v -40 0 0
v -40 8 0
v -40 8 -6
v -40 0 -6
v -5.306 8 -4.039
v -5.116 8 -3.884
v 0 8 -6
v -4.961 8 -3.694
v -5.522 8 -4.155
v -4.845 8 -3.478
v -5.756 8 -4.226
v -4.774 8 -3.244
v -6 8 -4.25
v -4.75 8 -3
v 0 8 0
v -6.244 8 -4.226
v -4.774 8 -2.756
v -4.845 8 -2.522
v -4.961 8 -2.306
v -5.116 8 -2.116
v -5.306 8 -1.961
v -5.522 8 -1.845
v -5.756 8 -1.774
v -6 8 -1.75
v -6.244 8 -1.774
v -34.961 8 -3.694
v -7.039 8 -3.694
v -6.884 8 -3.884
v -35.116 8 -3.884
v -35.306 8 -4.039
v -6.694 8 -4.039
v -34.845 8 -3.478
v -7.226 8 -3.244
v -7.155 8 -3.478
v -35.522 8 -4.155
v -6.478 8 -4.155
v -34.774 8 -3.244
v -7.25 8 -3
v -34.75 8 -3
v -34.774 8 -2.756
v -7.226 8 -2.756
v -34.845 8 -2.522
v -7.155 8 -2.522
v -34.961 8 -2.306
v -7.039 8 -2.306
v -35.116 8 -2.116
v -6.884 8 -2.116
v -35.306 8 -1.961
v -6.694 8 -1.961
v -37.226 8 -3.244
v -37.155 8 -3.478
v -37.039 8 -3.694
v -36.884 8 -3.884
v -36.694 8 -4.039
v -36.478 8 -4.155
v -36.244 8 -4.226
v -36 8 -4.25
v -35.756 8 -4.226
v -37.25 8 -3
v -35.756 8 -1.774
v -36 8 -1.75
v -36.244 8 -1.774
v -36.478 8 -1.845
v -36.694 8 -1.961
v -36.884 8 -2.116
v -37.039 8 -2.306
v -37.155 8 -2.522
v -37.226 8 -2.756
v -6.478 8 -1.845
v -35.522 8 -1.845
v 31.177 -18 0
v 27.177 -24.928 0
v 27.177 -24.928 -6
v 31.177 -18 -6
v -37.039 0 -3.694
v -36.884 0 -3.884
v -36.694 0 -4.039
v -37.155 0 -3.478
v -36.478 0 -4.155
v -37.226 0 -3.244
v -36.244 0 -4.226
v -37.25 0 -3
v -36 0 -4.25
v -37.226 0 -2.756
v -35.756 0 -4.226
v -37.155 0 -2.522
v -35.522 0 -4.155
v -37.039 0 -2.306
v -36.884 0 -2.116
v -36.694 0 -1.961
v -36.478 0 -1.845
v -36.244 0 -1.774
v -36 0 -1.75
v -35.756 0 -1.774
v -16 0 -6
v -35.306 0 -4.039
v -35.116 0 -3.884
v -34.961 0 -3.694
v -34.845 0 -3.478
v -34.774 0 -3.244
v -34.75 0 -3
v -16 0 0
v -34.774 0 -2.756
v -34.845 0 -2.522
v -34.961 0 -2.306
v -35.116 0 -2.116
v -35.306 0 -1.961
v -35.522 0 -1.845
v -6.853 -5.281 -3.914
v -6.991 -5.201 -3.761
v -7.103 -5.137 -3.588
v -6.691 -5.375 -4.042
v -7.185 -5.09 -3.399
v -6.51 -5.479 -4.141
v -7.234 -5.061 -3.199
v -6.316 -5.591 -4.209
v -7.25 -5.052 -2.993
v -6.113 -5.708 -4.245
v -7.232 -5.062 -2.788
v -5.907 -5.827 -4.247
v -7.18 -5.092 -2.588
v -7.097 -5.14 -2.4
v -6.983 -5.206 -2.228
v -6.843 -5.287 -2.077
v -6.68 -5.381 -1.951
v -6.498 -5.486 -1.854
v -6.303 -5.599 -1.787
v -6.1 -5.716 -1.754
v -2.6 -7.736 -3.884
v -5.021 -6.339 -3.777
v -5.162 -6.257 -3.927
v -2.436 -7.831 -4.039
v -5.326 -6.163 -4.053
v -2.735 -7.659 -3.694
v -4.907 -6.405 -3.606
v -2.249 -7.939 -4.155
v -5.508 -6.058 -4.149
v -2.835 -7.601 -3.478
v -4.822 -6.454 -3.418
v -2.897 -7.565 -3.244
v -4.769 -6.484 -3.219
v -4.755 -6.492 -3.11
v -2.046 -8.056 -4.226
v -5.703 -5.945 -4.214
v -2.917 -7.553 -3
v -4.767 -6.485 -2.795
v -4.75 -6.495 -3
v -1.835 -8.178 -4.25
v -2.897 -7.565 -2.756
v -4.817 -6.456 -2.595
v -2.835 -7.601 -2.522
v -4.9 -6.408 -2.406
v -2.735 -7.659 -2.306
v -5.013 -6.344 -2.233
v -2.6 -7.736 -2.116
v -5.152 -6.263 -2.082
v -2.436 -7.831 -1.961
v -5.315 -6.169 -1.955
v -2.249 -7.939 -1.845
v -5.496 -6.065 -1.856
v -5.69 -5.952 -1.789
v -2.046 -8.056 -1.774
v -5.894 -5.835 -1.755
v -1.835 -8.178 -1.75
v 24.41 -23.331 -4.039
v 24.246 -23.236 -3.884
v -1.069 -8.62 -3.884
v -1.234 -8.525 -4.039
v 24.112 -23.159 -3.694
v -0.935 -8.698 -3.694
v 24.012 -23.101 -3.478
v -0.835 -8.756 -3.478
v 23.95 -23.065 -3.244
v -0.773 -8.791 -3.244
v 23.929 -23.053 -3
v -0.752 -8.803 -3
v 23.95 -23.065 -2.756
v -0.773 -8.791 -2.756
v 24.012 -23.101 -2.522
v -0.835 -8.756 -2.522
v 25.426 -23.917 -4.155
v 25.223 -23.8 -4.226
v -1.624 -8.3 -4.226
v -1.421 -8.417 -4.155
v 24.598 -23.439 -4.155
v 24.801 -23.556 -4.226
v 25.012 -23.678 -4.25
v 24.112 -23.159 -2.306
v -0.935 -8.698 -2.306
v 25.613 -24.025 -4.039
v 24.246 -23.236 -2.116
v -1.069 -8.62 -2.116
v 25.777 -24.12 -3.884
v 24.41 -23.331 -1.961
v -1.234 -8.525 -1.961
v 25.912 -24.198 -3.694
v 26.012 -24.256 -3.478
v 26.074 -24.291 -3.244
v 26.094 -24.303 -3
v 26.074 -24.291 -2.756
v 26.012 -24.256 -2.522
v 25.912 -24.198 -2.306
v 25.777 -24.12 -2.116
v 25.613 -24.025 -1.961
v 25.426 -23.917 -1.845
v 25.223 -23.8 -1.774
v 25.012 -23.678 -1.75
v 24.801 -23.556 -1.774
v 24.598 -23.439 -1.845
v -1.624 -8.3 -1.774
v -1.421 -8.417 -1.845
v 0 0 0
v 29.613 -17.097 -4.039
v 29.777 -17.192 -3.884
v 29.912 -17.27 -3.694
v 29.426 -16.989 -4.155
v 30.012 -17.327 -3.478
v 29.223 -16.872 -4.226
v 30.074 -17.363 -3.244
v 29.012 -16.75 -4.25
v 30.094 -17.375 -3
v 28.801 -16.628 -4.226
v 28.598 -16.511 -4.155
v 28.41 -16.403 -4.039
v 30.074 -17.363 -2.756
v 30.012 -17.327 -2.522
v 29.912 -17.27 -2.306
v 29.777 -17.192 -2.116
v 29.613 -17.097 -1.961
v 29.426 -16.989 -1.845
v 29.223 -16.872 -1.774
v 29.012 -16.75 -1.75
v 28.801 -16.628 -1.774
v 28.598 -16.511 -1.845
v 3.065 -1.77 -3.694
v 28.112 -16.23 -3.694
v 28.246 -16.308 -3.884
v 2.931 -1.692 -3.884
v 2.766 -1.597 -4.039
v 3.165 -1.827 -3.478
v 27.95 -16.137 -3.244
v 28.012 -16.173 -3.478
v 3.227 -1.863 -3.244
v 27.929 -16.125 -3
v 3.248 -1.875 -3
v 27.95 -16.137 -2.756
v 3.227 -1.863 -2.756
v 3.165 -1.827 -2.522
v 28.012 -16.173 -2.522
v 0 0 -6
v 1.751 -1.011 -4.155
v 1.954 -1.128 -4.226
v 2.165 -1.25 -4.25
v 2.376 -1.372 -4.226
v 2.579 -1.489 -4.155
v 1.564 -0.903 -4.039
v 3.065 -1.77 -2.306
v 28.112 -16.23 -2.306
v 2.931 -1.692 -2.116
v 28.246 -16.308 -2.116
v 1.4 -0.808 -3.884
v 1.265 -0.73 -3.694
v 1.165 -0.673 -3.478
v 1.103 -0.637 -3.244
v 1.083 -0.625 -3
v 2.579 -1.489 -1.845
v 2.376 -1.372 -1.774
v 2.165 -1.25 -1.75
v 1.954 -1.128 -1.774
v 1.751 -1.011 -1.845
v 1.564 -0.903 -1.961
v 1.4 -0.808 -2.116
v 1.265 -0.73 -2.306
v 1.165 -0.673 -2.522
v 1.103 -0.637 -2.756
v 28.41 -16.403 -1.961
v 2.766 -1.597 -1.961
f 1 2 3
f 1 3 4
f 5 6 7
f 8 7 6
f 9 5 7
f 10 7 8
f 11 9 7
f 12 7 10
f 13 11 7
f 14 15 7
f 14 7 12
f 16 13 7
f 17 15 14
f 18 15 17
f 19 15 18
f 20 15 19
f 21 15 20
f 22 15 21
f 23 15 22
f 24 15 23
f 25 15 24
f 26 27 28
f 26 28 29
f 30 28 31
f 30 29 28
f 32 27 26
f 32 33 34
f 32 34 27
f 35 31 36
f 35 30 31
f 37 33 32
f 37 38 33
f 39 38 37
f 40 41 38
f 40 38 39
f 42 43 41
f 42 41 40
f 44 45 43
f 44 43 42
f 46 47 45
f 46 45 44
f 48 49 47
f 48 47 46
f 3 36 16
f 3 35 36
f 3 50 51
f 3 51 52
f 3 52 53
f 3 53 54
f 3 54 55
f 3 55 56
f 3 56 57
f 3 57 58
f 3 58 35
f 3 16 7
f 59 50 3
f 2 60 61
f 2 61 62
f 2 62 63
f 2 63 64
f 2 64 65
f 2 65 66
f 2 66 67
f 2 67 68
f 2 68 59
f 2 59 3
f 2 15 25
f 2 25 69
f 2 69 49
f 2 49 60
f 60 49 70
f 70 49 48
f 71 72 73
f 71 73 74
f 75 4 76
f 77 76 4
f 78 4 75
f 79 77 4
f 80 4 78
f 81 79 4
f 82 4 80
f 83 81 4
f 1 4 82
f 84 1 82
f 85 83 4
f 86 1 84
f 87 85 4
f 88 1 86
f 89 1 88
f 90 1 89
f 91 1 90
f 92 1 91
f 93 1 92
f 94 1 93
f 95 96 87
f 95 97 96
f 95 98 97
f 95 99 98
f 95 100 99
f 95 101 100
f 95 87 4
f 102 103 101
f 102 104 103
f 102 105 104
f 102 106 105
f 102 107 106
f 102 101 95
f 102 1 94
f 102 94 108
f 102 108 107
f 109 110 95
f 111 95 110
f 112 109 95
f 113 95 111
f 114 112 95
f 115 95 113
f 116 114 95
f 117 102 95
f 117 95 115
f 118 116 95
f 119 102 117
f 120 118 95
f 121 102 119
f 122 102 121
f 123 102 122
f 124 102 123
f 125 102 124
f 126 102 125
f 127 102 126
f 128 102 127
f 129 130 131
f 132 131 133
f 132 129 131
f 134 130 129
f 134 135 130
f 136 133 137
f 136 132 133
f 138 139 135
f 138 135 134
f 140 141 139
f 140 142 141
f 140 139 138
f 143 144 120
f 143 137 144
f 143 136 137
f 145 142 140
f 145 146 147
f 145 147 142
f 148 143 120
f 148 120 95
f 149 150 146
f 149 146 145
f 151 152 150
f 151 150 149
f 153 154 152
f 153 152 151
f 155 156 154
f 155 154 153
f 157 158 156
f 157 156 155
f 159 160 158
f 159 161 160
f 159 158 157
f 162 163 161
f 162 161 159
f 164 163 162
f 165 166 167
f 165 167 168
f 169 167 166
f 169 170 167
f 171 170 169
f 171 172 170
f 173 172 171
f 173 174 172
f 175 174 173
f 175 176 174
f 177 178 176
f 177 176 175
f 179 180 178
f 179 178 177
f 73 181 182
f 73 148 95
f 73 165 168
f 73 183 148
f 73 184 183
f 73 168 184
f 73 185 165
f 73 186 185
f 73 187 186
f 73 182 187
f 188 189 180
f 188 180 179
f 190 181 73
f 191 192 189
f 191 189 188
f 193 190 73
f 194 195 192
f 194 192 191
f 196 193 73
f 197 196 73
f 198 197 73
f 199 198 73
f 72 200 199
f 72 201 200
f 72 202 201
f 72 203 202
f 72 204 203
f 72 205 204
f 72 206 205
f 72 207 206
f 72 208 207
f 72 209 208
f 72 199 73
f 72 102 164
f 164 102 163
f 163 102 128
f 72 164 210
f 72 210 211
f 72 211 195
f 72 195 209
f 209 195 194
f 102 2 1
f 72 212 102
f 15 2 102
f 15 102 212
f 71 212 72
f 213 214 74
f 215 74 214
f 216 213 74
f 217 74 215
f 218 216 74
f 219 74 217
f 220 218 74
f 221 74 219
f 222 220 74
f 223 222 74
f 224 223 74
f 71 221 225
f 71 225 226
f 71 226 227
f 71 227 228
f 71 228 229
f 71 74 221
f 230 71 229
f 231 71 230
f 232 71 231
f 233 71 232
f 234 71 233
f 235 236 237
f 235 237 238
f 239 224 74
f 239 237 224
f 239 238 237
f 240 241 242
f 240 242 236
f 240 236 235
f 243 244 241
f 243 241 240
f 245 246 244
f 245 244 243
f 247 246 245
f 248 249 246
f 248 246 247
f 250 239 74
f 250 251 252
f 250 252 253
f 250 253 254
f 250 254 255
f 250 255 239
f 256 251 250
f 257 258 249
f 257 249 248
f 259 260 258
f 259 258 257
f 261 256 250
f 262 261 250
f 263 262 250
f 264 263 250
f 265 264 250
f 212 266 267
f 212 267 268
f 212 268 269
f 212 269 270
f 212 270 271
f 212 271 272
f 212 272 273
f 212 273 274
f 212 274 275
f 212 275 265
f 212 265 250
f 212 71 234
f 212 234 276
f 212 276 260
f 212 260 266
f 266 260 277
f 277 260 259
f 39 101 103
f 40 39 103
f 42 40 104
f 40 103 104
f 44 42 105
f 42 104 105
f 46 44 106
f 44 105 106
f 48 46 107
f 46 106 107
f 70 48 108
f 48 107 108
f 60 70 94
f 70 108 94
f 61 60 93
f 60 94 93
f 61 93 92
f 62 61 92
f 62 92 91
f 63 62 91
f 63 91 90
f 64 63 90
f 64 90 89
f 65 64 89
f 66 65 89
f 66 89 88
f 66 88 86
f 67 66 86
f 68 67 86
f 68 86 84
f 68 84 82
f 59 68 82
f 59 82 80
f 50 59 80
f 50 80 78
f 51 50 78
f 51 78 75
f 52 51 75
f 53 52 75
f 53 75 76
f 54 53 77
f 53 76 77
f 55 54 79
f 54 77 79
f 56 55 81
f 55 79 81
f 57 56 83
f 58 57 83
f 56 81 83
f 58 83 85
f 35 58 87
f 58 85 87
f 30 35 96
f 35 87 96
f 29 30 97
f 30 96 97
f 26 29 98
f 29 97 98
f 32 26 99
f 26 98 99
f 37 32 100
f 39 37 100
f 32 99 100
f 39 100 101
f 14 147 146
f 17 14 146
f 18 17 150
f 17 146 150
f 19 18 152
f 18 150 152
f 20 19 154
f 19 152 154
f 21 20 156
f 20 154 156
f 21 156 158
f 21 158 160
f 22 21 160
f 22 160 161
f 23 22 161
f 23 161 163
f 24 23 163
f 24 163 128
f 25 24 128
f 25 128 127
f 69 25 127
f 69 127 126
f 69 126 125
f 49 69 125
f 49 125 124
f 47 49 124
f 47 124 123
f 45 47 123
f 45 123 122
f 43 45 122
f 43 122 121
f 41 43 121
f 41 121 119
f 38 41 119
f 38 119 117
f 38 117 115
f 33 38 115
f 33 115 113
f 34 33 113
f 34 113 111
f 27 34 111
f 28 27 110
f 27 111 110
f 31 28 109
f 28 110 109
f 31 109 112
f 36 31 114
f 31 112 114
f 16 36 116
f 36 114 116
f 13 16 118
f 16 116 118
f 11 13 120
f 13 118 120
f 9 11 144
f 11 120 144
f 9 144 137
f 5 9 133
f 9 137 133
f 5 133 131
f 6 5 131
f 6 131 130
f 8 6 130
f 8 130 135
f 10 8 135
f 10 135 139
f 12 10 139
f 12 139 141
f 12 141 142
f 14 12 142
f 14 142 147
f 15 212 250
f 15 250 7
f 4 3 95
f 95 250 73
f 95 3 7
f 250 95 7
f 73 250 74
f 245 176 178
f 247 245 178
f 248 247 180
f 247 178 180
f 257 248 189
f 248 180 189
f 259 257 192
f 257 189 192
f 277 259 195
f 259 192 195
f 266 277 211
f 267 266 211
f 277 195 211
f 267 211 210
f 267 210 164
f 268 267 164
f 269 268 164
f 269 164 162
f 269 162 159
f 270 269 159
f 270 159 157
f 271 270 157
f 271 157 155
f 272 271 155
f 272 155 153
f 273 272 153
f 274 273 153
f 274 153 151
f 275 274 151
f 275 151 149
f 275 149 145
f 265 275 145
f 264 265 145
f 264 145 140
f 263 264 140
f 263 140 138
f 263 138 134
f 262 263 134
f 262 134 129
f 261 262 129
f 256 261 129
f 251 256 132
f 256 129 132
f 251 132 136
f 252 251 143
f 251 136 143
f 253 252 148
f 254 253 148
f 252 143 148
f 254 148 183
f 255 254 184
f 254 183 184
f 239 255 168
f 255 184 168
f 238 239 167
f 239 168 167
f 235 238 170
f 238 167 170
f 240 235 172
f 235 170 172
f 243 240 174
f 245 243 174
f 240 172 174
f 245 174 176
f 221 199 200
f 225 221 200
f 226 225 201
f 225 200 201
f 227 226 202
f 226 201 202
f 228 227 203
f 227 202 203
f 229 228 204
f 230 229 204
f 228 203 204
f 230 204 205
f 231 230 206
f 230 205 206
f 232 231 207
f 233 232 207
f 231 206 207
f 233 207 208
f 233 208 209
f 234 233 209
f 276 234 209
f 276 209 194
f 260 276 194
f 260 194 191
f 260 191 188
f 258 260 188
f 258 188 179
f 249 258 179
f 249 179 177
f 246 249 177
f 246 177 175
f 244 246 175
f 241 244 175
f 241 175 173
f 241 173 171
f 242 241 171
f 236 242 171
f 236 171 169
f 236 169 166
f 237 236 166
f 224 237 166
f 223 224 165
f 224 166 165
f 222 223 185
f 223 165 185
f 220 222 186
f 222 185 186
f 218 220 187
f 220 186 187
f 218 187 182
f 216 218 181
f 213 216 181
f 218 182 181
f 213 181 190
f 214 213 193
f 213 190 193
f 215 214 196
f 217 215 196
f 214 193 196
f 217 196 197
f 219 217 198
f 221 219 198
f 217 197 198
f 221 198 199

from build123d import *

# Parameters (mm, degrees)
F1_DEPTH   = 6
F4_D       = 2.5
F4_ON_F2_D = 2.5


with BuildPart() as f1:
    # F0 (on Top) → F1 (new body)
    with BuildSketch(Plane.XY):
        Polygon((-16, 0), (0, 0), (0, 8), (-40, 8), (-40, 0), align=None)
        Polygon((31.1769145362, -18), (0, 0), (-16, 0), (27.1769145362, -24.9282032303), align=None)
    extrude(amount=-F1_DEPTH)

    # F4 (through all)
    with Locations(Plane(origin=(0, 0, 0), x_dir=(-0.8660254038, 0.5, 0), z_dir=(0.5, 0.8660254038, 0))):
        with Locations((-33.5, -3), (-2.5, -3)):
            Hole(F4_D / 2)

    # F4 on F2 (through all)
    with Locations(Plane(origin=(0, 8, 0), x_dir=(-1, 0, 0), z_dir=(0, 1, 0))):
        with Locations((6, -3), (36, -3)):
            Hole(F4_ON_F2_D / 2)


solid = f1.part
